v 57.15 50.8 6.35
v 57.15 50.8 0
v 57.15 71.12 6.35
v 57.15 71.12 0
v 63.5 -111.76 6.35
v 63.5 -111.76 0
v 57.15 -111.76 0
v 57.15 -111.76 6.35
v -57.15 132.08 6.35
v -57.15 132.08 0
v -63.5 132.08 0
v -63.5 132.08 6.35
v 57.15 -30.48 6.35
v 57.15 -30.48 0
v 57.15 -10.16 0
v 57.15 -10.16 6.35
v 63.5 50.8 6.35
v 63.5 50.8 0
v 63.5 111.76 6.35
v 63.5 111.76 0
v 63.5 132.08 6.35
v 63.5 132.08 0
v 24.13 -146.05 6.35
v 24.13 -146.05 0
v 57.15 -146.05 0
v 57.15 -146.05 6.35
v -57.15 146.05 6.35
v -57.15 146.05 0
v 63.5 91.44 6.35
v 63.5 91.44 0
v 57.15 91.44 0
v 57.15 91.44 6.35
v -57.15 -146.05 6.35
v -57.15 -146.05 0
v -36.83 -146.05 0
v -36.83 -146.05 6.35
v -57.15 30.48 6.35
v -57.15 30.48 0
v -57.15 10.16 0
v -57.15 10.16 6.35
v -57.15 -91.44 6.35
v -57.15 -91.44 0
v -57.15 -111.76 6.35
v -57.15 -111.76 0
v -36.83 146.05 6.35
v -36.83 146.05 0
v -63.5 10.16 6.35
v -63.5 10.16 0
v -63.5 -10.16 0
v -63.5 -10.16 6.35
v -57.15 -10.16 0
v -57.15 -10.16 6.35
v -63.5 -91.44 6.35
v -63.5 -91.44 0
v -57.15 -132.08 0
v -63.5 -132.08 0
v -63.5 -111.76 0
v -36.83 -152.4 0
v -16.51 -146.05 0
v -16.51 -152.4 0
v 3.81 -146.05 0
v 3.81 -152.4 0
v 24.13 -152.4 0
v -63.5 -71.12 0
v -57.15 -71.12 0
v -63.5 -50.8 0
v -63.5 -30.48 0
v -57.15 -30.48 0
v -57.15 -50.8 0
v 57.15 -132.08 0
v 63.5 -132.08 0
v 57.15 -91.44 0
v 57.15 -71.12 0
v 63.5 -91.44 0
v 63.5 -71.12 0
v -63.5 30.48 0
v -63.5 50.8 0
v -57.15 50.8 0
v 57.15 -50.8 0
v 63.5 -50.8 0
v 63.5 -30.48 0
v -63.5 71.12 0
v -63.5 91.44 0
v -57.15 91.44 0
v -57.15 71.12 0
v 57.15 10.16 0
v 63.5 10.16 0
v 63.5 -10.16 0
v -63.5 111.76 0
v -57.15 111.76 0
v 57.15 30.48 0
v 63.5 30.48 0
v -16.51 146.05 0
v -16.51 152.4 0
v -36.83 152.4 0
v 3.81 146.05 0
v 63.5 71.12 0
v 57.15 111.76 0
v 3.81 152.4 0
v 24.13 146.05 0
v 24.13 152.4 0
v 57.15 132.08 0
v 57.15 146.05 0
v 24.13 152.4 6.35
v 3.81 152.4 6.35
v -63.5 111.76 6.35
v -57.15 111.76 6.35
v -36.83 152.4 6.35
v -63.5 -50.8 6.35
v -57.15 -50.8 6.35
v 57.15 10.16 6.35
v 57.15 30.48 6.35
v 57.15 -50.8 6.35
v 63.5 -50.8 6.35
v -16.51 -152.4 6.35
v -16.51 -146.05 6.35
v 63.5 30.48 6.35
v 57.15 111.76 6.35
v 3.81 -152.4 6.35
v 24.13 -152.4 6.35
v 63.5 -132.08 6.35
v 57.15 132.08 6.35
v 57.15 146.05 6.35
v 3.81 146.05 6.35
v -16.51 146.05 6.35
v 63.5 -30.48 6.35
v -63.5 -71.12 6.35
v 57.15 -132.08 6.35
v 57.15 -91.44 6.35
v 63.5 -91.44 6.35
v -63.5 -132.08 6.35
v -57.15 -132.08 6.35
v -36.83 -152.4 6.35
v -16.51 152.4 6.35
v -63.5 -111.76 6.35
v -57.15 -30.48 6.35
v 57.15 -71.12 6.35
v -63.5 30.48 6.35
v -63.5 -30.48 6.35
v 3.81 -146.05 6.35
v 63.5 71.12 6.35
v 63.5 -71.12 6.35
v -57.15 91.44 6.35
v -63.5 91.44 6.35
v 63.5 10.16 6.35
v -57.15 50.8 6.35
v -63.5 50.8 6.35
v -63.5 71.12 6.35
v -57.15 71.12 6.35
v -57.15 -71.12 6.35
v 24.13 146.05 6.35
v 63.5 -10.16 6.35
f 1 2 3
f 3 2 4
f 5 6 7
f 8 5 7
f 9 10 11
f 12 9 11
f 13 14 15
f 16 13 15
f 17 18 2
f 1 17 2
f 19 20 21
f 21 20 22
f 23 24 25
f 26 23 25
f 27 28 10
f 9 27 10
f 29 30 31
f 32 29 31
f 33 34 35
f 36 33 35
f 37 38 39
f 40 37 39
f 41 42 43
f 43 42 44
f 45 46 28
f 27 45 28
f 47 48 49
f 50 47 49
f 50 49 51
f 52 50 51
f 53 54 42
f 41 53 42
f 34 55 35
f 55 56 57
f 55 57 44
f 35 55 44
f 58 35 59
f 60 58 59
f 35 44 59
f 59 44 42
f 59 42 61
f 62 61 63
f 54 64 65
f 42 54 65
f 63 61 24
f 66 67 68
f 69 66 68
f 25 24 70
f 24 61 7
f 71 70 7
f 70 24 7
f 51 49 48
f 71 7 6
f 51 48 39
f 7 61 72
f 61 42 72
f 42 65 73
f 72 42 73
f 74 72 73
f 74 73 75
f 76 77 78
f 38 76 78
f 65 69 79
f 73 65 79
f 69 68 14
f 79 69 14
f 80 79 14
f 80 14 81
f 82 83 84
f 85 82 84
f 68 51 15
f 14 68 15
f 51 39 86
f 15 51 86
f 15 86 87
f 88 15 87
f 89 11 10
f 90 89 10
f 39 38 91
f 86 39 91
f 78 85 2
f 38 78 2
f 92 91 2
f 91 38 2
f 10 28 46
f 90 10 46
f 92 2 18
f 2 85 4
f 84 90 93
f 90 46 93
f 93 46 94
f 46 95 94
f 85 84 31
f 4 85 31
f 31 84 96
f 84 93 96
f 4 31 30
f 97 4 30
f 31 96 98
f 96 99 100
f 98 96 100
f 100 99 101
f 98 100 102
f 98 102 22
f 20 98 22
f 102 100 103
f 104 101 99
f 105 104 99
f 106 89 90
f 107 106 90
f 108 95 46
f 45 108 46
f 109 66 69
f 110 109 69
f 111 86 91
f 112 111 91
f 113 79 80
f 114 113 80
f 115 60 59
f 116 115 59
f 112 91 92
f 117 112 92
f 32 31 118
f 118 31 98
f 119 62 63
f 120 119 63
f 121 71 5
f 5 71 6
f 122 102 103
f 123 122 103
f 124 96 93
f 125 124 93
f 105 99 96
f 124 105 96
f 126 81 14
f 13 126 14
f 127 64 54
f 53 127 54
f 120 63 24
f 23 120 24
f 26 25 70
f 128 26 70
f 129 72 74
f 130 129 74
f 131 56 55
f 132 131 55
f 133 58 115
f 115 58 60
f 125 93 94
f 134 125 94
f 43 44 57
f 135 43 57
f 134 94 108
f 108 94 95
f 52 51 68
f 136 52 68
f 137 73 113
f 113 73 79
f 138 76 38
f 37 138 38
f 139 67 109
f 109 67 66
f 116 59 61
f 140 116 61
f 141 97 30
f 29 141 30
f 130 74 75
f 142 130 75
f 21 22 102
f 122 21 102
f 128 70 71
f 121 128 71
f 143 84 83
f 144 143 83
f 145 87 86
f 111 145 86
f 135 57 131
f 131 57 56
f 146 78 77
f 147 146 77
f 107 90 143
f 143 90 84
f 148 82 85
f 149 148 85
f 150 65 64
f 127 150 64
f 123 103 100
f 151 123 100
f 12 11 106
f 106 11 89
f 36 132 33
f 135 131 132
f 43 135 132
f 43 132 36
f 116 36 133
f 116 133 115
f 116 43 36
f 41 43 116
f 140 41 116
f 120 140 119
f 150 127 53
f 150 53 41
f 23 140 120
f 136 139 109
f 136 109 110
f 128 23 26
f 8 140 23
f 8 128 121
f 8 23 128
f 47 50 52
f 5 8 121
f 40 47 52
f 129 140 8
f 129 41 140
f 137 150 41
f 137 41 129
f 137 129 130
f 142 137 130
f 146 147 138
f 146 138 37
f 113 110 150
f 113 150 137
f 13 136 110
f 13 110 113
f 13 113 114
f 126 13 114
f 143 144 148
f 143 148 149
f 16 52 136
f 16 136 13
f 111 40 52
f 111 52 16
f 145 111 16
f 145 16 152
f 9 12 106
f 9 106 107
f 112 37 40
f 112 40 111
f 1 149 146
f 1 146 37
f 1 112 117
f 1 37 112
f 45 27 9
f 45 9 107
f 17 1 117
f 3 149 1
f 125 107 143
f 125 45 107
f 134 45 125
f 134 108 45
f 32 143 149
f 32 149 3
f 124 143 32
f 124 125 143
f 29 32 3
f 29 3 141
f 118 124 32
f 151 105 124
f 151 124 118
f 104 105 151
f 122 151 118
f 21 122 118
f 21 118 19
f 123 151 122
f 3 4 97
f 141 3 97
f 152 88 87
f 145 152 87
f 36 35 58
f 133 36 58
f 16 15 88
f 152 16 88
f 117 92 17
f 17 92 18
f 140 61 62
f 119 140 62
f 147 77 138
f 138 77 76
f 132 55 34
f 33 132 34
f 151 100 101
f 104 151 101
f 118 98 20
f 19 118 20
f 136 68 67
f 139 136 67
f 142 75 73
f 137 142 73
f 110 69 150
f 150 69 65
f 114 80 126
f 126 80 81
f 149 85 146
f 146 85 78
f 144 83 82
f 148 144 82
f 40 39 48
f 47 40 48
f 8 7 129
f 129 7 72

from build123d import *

# Parameters (mm, degrees)
F1_DEPTH = 6.35


with BuildPart() as f1:
    # F0 (on Top) → F1 (new body)
    with BuildSketch(Plane.XY):
        Polygon((57.15, 132.08), (57.15, 146.05), (24.13, 146.05), (24.13, 152.4), (3.81, 152.4), (3.81, 146.05), (-16.51, 146.05), (-16.51, 152.4), (-36.83, 152.4), (-36.83, 146.05), (-57.15, 146.05), (-57.15, 132.08), (-63.5, 132.08), (-63.5, 111.76), (-57.15, 111.76), (-57.15, 91.44), (-63.5, 91.44), (-63.5, 71.12), (-57.15, 71.12), (-57.15, 50.8), (-63.5, 50.8), (-63.5, 30.48), (-57.15, 30.48), (-57.15, 10.16), (-63.5, 10.16), (-63.5, -10.16), (-57.15, -10.16), (-57.15, -30.48), (-63.5, -30.48), (-63.5, -50.8), (-57.15, -50.8), (-57.15, -71.12), (-63.5, -71.12), (-63.5, -91.44), (-57.15, -91.44), (-57.15, -111.76), (-63.5, -111.76), (-63.5, -132.08), (-57.15, -132.08), (-57.15, -146.05), (-36.83, -146.05), (-36.83, -152.4), (-16.51, -152.4), (-16.51, -146.05), (3.81, -146.05), (3.81, -152.4), (24.13, -152.4), (24.13, -146.05), (57.15, -146.05), (57.15, -132.08), (63.5, -132.08), (63.5, -111.76), (57.15, -111.76), (57.15, -91.44), (63.5, -91.44), (63.5, -71.12), (57.15, -71.12), (57.15, -50.8), (63.5, -50.8), (63.5, -30.48), (57.15, -30.48), (57.15, -10.16), (63.5, -10.16), (63.5, 10.16), (57.15, 10.16), (57.15, 30.48), (63.5, 30.48), (63.5, 50.8), (57.15, 50.8), (57.15, 71.12), (63.5, 71.12), (63.5, 91.44), (57.15, 91.44), (57.15, 111.76), (63.5, 111.76), (63.5, 132.08), align=None)
    extrude(amount=F1_DEPTH)


solid = f1.part
